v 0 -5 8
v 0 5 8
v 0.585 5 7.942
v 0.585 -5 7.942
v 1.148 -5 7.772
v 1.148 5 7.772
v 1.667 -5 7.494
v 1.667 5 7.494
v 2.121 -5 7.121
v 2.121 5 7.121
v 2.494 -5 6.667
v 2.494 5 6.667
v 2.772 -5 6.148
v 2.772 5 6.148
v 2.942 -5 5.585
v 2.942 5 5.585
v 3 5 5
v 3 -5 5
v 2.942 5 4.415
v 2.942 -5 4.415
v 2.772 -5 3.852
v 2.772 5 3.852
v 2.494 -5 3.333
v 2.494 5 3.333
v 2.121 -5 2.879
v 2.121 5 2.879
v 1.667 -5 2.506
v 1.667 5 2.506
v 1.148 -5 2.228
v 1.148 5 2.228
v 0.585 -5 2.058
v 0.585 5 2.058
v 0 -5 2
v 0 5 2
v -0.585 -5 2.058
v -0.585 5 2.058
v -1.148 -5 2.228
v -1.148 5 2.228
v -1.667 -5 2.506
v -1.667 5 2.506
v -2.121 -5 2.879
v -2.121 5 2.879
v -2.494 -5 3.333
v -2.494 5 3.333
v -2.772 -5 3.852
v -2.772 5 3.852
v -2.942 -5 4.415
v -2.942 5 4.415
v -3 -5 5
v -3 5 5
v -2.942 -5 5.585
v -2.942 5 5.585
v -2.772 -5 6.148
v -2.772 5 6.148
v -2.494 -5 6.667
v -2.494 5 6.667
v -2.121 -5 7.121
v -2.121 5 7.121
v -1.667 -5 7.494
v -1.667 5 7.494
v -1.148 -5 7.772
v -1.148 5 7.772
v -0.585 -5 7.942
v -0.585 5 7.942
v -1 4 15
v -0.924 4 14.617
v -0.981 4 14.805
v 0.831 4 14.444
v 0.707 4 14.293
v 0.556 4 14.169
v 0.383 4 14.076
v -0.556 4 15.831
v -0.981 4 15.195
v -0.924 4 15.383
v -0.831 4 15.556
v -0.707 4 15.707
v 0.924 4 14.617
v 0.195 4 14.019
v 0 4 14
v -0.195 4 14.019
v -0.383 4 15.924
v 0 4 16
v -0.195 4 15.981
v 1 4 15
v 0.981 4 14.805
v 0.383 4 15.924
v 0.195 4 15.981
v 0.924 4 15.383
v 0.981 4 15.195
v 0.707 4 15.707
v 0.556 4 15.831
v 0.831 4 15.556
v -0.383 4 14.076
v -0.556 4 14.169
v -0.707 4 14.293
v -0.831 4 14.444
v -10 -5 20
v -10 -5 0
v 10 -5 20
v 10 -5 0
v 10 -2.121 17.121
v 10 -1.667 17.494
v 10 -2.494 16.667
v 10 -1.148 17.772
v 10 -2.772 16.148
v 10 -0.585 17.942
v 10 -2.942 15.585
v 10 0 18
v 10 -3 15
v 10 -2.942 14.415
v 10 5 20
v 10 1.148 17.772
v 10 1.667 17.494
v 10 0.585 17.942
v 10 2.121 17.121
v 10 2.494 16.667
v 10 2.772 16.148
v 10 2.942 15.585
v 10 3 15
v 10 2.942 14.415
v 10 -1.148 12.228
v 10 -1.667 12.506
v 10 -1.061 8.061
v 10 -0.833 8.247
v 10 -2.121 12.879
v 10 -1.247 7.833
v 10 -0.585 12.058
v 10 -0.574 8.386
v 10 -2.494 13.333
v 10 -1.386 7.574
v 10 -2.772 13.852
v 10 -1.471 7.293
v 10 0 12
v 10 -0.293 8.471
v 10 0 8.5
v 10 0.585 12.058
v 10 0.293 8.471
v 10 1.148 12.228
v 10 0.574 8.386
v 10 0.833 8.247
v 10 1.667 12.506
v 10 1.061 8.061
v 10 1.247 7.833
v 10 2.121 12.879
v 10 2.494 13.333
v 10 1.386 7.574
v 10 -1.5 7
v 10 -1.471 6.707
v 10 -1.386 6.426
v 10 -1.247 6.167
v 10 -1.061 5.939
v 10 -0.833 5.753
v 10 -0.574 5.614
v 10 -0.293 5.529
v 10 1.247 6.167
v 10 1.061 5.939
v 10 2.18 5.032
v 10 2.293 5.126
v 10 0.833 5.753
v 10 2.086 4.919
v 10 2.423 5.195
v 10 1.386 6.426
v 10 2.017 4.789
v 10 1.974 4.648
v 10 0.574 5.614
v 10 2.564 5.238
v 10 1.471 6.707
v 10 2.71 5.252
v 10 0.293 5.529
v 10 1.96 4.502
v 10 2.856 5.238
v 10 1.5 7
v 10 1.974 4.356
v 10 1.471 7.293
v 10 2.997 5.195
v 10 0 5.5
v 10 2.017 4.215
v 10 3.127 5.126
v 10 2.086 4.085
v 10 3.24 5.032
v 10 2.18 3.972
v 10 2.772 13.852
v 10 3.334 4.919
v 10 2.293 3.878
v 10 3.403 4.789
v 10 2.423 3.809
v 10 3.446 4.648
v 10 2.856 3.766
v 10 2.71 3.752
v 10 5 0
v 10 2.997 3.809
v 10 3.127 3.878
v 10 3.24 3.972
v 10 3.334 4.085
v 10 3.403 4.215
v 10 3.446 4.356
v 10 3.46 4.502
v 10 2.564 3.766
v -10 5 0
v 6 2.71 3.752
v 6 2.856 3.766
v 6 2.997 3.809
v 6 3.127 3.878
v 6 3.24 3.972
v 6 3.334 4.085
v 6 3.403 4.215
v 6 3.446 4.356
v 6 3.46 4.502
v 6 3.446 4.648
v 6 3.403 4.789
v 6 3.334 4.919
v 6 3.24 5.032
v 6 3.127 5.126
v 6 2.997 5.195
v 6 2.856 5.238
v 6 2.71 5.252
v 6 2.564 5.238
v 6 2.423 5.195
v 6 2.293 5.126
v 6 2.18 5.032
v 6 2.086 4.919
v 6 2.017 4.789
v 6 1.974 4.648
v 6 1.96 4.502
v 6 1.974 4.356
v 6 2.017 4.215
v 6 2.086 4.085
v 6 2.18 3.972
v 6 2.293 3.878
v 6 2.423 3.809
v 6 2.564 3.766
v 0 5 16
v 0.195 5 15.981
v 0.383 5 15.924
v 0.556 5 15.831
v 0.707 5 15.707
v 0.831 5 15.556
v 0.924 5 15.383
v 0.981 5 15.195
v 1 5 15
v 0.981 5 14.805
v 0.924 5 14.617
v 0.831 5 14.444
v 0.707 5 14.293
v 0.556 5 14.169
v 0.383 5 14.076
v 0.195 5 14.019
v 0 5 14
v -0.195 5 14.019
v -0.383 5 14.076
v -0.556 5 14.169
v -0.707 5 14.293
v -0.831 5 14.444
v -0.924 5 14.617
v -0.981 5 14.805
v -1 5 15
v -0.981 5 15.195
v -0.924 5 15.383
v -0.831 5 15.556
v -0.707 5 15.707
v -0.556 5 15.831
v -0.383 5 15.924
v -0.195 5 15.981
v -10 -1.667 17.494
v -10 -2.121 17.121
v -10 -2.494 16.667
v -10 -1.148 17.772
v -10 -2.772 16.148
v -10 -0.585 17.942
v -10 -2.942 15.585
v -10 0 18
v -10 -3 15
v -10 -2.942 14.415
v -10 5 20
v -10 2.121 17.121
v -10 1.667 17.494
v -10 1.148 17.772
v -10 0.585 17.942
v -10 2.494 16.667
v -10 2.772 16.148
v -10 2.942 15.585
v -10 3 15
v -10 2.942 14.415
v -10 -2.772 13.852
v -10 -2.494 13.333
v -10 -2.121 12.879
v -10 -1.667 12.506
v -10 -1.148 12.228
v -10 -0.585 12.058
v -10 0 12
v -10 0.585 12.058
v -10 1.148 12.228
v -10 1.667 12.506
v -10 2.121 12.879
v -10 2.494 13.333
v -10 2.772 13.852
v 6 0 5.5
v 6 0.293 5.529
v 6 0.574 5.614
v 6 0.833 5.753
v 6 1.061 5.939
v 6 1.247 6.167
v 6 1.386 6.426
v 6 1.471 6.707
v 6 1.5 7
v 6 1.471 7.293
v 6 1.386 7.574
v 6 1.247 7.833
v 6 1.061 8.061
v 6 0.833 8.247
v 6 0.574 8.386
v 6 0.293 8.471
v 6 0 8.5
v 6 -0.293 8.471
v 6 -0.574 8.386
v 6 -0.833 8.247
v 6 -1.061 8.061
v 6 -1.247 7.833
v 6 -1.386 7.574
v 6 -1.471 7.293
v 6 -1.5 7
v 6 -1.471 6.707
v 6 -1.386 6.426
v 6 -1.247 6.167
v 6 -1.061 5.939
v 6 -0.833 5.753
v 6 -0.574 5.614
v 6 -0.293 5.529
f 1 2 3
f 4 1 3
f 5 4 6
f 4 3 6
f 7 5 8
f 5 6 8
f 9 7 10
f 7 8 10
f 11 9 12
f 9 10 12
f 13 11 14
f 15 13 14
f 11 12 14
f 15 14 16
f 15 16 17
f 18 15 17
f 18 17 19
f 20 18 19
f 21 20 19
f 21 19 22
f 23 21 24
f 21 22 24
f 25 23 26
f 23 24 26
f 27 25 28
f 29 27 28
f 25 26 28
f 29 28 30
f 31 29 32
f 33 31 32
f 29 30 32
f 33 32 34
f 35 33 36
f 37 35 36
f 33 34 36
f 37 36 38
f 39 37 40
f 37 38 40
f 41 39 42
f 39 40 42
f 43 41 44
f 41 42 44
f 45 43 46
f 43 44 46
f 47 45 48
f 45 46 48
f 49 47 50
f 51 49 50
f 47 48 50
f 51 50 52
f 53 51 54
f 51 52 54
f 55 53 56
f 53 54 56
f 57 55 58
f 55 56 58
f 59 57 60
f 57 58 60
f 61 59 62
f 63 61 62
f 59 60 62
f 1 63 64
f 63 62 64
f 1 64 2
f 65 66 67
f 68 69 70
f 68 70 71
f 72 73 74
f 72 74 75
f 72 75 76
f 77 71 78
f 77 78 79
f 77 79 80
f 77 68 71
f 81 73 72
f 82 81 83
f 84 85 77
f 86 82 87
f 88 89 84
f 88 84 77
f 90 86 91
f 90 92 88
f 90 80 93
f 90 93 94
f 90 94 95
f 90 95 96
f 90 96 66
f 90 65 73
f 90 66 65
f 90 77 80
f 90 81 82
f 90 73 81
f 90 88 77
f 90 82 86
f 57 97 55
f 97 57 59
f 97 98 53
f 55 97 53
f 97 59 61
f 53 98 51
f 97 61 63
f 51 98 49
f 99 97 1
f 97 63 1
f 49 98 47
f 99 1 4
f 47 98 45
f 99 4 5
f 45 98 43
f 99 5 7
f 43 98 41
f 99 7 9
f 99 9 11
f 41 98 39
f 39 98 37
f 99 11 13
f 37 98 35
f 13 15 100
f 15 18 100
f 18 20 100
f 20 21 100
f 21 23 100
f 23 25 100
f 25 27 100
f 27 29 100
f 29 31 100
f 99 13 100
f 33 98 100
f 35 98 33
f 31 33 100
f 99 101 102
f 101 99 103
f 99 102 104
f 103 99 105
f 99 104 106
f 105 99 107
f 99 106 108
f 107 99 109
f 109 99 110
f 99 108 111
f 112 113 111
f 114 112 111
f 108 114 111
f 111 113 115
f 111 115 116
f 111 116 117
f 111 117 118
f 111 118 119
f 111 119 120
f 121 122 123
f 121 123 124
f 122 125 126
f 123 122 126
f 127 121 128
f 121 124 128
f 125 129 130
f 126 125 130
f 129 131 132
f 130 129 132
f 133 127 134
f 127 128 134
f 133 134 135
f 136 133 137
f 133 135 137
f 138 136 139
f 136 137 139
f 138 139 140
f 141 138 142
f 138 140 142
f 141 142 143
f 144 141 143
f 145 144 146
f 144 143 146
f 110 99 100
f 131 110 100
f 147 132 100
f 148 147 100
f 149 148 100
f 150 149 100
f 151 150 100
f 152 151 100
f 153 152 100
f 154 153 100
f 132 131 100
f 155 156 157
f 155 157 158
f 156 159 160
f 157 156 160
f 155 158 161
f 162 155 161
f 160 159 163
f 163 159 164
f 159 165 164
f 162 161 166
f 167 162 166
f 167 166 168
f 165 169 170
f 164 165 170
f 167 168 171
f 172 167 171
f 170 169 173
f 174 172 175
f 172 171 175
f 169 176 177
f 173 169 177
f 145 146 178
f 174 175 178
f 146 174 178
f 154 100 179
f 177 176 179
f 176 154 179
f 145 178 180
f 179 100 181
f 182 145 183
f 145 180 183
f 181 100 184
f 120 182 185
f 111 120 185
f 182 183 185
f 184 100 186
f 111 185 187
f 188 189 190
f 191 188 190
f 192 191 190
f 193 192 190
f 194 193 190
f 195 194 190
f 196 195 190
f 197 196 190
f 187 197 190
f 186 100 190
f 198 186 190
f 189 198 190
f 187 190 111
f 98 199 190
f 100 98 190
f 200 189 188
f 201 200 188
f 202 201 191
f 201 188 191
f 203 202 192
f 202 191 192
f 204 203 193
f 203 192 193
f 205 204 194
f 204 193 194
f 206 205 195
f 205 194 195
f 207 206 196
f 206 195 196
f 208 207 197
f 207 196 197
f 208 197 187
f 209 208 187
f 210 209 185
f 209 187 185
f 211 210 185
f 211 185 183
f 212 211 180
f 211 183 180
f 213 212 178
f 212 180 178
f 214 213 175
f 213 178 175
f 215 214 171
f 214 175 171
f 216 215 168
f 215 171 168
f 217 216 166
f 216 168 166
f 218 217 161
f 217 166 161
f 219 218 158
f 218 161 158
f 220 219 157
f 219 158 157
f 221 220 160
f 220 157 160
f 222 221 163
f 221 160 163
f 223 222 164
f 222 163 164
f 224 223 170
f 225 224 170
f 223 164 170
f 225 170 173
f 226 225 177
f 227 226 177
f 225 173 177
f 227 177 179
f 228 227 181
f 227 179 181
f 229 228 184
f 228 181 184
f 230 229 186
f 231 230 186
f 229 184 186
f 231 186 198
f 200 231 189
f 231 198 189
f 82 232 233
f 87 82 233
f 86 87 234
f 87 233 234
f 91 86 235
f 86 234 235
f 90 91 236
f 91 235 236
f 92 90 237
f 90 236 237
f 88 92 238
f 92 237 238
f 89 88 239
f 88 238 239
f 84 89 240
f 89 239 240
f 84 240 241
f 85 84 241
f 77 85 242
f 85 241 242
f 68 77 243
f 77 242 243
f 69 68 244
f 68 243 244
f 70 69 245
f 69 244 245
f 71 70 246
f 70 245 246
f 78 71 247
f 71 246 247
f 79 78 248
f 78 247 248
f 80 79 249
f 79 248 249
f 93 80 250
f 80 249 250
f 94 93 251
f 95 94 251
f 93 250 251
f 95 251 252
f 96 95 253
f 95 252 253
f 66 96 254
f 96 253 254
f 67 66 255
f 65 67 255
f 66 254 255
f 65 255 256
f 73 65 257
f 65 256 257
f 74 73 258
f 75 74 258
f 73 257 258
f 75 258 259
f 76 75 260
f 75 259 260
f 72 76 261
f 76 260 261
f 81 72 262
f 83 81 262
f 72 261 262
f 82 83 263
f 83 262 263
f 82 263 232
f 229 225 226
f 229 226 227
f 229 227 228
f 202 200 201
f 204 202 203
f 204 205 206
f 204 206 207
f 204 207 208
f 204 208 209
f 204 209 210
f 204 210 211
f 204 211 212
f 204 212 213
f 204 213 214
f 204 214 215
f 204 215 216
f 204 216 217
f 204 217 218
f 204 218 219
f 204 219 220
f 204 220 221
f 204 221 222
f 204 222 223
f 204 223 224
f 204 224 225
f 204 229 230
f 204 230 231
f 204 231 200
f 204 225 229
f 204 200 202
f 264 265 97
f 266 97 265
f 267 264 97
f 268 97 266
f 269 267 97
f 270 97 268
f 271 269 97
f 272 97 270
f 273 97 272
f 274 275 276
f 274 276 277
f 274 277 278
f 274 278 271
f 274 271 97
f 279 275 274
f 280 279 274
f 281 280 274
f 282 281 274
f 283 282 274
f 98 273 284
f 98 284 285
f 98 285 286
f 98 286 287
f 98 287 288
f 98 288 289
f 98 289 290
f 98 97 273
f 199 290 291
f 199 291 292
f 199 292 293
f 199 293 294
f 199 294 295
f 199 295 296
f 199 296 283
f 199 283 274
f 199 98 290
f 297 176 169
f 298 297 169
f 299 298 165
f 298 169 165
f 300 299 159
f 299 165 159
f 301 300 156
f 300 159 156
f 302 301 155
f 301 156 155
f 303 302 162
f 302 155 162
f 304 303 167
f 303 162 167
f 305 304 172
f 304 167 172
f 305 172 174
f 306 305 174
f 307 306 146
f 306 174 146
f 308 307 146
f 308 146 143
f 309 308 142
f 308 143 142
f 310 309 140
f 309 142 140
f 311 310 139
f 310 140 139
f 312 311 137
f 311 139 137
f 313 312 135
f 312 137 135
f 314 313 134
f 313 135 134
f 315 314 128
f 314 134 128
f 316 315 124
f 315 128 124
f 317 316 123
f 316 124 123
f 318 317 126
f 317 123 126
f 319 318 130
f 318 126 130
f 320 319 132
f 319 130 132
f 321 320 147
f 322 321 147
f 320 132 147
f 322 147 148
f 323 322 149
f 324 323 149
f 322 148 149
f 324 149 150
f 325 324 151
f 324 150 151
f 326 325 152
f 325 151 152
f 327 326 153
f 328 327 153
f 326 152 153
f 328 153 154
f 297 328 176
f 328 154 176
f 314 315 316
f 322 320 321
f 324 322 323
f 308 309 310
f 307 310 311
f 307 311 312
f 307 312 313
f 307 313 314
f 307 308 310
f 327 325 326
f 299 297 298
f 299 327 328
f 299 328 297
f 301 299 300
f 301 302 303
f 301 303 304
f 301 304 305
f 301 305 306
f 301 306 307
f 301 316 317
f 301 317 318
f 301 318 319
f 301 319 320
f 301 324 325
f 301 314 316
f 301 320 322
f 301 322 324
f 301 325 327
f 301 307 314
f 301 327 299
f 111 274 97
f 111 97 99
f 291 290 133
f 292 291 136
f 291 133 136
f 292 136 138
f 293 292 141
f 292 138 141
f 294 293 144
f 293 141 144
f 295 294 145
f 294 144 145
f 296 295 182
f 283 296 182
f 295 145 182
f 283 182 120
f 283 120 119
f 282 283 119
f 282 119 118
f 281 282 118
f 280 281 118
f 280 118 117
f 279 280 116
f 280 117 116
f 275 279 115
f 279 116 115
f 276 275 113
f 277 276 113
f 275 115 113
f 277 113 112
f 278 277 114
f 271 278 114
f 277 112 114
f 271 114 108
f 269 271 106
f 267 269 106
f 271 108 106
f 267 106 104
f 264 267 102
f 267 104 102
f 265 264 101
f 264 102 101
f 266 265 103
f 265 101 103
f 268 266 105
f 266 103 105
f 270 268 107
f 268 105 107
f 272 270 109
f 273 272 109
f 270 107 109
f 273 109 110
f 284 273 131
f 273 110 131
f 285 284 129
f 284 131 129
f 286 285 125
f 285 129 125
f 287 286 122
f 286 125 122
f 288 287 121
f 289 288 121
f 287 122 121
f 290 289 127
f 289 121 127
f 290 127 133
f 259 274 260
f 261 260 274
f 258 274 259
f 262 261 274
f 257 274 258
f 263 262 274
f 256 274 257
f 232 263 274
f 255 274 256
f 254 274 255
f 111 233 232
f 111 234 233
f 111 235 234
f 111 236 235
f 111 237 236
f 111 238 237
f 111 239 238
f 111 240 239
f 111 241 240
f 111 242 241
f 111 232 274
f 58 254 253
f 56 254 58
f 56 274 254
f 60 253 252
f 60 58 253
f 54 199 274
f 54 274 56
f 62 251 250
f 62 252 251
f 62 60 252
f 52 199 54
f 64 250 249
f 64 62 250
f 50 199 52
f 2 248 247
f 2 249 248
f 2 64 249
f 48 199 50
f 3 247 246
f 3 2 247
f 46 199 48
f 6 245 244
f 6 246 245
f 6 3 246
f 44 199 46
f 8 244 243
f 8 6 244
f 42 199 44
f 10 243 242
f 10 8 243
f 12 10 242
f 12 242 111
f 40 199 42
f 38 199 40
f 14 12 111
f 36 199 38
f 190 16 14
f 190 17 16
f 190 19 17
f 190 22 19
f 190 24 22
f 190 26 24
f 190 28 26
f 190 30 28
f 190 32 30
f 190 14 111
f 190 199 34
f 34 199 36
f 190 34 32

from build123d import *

# Parameters (mm, degrees)
SKETCH1_W           = 20
SKETCH1_H           = 10
BOSS_EXTRUDE1_DEPTH = 20
SKETCH3_R           = 3
CUT_EXTRUDE1_DEPTH  = 10
SKETCH4_R           = 1
CUT_EXTRUDE2_DEPTH  = 1
SKETCH7_R           = 3
CUT_EXTRUDE10_DEPTH = 20
SKETCH8_R           = 1.5
SKETCH8_R_2         = 0.75
CUT_EXTRUDE11_DEPTH = 4


with BuildPart() as part:
    # Sketch1 → Boss-Extrude1 (new body)
    with BuildSketch(Plane.XY):
        Rectangle(SKETCH1_W, SKETCH1_H)
    extrude(amount=BOSS_EXTRUDE1_DEPTH)

    # Sketch3 → Cut-Extrude1 (cut)
    with BuildSketch(Plane(origin=(0, 5, 0), x_dir=(1, 0, 0), z_dir=(0, 1, 0))):
        with Locations(Location((0, -5, 0), (0, 0, 270))):
            Circle(SKETCH3_R)
    extrude(amount=-CUT_EXTRUDE1_DEPTH, mode=Mode.SUBTRACT)

    # Sketch4 → Cut-Extrude2 (cut)
    with BuildSketch(Plane(origin=(0, 5, 0), x_dir=(1, 0, 0), z_dir=(0, 1, 0))):
        with Locations(Location((0, -15, 0), (0, 0, 270))):
            Circle(SKETCH4_R)
    extrude(amount=-CUT_EXTRUDE2_DEPTH, mode=Mode.SUBTRACT)

    # Sketch7 → Cut-Extrude10 (cut)
    with BuildSketch(Plane(origin=(10, 0, 0), x_dir=(0, 0, -1), z_dir=(1, 0, 0))):
        with Locations((-15, 0)):
            Circle(SKETCH7_R)
    extrude(amount=-CUT_EXTRUDE10_DEPTH, mode=Mode.SUBTRACT)

    # Sketch8 → Cut-Extrude11 (cut)
    with BuildSketch(Plane(origin=(10, 0, 0), x_dir=(0, 0, -1), z_dir=(1, 0, 0))):
        with Locations((-7, 0)):
            Circle(SKETCH8_R)
        with Locations((-4.501923946, 2.710056555)):
            Circle(SKETCH8_R_2)
    extrude(amount=-CUT_EXTRUDE11_DEPTH, mode=Mode.SUBTRACT)


solid = part.part
